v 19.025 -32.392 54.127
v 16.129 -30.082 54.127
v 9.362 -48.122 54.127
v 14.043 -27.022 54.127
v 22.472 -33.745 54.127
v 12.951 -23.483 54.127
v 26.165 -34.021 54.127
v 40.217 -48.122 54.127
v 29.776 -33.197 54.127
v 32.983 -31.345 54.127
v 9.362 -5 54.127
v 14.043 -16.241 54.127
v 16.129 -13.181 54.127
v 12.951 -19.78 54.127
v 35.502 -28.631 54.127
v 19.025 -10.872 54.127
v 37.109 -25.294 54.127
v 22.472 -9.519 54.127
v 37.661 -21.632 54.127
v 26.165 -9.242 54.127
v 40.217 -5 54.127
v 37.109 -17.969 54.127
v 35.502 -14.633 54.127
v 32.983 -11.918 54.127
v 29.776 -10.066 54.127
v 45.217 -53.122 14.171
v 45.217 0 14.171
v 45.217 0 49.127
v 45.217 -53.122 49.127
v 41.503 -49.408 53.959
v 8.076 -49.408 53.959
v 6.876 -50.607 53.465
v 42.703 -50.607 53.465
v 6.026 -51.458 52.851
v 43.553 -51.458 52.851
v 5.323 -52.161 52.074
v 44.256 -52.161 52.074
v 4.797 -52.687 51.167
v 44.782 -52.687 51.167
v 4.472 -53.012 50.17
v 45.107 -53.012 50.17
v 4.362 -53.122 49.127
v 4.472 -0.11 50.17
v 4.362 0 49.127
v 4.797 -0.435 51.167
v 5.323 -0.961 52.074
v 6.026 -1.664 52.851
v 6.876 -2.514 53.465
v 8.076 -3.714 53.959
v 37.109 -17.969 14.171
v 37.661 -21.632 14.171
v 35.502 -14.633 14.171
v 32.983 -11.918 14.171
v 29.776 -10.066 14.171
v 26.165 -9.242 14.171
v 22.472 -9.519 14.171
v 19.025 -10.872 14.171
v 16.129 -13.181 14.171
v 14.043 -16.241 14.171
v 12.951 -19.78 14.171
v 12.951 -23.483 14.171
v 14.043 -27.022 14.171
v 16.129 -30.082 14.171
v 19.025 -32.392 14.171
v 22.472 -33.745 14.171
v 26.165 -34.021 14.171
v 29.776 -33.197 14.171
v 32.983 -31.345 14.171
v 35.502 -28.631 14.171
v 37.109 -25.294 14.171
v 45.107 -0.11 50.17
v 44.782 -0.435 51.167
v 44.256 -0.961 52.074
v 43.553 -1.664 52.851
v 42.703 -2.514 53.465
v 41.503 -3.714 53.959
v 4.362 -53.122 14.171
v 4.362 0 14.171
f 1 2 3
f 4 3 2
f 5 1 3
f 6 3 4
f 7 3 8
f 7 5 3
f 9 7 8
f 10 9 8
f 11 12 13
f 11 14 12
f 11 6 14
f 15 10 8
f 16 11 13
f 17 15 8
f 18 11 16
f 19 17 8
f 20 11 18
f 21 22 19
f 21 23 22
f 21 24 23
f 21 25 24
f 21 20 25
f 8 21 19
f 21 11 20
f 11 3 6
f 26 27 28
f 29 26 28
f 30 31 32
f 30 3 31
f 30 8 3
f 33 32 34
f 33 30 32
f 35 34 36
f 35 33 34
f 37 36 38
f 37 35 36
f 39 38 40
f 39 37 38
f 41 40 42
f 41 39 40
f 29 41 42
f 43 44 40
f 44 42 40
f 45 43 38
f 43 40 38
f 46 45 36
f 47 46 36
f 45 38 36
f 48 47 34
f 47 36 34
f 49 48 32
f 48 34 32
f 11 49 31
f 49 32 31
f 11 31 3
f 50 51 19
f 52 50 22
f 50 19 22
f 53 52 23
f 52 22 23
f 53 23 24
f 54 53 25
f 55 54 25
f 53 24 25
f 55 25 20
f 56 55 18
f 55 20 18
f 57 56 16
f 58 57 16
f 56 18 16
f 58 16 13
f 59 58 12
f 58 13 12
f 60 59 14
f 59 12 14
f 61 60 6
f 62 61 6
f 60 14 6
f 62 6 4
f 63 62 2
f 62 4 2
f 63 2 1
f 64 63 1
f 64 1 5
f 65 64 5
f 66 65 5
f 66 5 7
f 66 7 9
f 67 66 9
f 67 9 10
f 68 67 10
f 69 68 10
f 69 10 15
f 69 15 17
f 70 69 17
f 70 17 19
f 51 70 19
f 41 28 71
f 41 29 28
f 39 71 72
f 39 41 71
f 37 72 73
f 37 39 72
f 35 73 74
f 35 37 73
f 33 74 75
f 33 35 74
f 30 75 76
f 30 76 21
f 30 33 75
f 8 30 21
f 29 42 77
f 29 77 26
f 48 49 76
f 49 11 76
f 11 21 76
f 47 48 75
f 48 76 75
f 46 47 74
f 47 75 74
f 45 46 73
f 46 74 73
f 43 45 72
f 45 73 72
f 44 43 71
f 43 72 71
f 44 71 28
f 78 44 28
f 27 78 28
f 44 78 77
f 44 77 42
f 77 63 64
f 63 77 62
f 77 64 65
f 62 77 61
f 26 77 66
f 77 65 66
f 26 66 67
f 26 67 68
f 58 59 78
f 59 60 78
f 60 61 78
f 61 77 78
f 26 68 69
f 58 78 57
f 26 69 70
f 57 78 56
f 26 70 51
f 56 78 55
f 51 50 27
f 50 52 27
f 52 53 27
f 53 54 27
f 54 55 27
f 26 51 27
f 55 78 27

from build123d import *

# Parameters (mm, degrees)
F0_W     = 40.854881
F0_H     = 39.956439
F1_DEPTH = 53.121515
F2_R     = 5
F3_R     = 12.424577
F4_DEPTH = 39.957439


with BuildPart() as f1:
    # F0 (on Front) → F1 (new body)
    with BuildSketch(Plane.XZ):
        with Locations((24.789358, 34.14881)):
            Rectangle(F0_W, F0_H)
    extrude(amount=F1_DEPTH)

    # F2
    f2_edges = [f1.edges().sort_by_distance(p)[0] for p in [
        (45.216799, -26.560757, 54.12703),
        (4.361918, -26.560757, 54.12703),
        (24.789358, 0, 54.12703),
        (24.789358, -53.121515, 54.12703),
    ]]
    fillet(f2_edges, radius=F2_R)

    # F3 (on face) → F4 (cut, through all)
    with BuildSketch(Plane.XY.offset(54.12703)):
        with Locations((25.2368, -21.631569)):
            Circle(F3_R)
    extrude(amount=-F4_DEPTH, mode=Mode.SUBTRACT)


solid = f1.part
